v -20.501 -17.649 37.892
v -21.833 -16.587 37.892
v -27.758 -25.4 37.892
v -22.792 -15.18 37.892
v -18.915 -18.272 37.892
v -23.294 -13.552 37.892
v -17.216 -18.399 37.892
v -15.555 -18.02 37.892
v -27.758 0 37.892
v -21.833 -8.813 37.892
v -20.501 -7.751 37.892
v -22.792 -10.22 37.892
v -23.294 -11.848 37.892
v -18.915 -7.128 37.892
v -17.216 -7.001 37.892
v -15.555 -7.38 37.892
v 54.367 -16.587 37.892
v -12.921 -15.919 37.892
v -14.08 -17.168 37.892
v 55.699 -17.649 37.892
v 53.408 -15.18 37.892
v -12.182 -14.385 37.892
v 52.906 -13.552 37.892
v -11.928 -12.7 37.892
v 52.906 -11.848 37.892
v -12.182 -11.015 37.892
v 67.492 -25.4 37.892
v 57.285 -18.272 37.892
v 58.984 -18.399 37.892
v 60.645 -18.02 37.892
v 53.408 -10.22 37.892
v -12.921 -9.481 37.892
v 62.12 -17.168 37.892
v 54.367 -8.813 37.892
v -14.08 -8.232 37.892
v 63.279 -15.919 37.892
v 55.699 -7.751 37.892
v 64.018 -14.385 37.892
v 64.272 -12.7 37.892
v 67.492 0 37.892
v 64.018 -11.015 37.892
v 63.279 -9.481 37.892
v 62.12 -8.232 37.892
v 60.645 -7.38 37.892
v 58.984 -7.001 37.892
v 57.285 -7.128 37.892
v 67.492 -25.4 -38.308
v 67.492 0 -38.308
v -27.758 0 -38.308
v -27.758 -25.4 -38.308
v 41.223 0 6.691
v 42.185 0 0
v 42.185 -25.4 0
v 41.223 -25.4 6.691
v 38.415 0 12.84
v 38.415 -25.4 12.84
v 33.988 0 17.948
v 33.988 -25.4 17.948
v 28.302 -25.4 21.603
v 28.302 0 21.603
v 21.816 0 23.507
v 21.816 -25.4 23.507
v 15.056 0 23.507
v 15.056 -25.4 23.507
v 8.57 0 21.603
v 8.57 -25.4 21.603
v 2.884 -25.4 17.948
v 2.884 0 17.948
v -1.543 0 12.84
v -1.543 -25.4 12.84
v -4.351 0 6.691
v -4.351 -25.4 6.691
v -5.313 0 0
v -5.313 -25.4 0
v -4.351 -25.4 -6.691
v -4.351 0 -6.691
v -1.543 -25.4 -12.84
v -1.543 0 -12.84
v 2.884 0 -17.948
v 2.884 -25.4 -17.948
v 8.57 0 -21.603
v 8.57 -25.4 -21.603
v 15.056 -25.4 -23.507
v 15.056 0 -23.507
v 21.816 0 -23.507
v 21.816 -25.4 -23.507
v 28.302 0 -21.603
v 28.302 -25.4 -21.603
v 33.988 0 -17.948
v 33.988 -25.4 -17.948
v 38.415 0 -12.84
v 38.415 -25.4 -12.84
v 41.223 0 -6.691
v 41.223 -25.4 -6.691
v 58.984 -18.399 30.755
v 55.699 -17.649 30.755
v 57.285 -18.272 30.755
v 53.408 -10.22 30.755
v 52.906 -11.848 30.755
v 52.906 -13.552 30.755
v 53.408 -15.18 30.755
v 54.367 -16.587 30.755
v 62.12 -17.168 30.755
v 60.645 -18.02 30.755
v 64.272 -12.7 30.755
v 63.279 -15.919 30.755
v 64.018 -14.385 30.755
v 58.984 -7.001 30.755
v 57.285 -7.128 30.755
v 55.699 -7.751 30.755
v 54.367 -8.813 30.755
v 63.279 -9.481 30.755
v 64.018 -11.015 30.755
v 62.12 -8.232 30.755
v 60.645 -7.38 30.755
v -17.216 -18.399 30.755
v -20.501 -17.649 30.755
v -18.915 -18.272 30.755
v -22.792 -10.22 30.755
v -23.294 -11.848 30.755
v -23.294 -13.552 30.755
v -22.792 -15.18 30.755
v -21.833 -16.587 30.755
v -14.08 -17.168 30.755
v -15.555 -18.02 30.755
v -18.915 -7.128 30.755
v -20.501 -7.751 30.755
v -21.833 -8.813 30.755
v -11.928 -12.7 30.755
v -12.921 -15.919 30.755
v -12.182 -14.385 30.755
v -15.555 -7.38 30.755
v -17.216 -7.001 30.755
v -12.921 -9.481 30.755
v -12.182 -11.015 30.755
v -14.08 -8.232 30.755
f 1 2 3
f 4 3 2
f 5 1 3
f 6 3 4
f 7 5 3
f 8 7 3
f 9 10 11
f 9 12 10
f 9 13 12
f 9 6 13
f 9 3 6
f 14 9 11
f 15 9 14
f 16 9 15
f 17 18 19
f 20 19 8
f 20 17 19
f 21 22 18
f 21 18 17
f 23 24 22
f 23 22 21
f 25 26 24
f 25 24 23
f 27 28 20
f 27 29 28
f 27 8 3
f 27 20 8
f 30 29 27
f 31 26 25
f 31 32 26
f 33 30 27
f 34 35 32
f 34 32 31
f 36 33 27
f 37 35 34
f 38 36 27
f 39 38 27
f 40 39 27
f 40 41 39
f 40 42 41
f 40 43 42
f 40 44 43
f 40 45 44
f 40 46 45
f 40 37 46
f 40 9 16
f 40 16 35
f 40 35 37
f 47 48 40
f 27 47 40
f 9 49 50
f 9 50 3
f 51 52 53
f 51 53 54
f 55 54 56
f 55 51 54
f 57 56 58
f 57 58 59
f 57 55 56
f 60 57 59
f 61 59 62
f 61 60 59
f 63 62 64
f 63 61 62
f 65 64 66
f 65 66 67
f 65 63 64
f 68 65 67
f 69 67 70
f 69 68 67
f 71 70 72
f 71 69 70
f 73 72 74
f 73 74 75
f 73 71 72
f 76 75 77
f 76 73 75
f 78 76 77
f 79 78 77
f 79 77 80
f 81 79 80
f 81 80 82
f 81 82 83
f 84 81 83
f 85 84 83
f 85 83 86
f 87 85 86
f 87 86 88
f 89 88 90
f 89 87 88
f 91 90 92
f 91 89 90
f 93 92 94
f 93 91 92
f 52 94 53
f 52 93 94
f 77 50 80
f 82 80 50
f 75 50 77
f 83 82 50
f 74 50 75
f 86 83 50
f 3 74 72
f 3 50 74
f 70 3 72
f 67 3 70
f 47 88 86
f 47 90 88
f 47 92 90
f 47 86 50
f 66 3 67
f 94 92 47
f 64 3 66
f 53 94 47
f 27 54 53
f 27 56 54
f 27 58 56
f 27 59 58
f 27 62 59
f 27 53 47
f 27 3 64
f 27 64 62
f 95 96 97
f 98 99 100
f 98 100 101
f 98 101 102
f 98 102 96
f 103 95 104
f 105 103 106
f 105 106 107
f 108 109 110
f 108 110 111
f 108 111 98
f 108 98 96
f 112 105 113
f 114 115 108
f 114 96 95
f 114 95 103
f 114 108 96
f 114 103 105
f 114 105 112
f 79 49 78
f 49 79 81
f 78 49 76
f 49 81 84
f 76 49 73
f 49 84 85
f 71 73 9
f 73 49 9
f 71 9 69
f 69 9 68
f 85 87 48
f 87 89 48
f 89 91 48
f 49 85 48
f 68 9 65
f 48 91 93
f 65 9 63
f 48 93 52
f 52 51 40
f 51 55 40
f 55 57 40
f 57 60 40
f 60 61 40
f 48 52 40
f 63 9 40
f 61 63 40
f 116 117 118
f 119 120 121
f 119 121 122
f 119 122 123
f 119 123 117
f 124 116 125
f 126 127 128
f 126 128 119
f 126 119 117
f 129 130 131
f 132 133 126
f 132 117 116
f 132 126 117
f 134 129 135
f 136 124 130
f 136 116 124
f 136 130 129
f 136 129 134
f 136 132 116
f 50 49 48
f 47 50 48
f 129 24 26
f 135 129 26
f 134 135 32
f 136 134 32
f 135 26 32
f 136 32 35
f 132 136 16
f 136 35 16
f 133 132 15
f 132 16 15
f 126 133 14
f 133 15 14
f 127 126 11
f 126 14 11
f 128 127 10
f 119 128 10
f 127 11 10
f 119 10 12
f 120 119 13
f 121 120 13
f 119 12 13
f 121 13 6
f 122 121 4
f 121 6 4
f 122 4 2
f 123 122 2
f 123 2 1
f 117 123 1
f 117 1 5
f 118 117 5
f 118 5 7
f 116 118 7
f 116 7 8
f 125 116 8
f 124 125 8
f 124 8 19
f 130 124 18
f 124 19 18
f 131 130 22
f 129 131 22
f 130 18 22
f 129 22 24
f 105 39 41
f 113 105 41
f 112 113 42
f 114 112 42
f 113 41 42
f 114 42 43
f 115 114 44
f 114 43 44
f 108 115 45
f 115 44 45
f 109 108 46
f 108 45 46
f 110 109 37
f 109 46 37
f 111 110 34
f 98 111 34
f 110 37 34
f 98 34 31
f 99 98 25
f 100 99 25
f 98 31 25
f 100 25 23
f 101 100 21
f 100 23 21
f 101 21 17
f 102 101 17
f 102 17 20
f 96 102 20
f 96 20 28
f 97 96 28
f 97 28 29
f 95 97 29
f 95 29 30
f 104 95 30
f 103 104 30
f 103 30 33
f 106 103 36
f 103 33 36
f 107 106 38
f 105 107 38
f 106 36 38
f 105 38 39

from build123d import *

# Parameters (mm, degrees)
F0_W     = 95.25
F0_H     = 76.2
F0_R     = 23.749
F1_DEPTH = 25.4
F2_R     = 3.5687
F3_DEPTH = 7.1374
F4_R     = 5.715
F5_DEPTH = 7.1374


with BuildPart() as f1:
    # F0 (on Front) → F1 (new body)
    with BuildSketch(Plane.XZ):
        with Locations((19.8670865009, -0.2076110487)):
            Rectangle(F0_W, F0_H)
        with Locations((18.436120823, 0)):
            Circle(F0_R, mode=Mode.SUBTRACT)
    extrude(amount=F1_DEPTH)

    # F2 (on face) → F3 (cut)
    with BuildSketch(Plane.XY.offset(37.8923889513)):
        with Locations((57.6765805199, -11.9477792656)):
            Circle(F2_R)
    extrude(amount=F3_DEPTH, mode=Mode.SUBTRACT)

    # F4 (on face) → F5 (cut)
    with BuildSketch(Plane.XY.offset(37.8923889513)):
        with Locations((-17.6432492146, -12.7)):
            Circle(F4_R)
        with Locations((58.5567507854, -12.7)):
            Circle(F4_R)
    extrude(amount=-F5_DEPTH, mode=Mode.SUBTRACT)


solid = f1.part
